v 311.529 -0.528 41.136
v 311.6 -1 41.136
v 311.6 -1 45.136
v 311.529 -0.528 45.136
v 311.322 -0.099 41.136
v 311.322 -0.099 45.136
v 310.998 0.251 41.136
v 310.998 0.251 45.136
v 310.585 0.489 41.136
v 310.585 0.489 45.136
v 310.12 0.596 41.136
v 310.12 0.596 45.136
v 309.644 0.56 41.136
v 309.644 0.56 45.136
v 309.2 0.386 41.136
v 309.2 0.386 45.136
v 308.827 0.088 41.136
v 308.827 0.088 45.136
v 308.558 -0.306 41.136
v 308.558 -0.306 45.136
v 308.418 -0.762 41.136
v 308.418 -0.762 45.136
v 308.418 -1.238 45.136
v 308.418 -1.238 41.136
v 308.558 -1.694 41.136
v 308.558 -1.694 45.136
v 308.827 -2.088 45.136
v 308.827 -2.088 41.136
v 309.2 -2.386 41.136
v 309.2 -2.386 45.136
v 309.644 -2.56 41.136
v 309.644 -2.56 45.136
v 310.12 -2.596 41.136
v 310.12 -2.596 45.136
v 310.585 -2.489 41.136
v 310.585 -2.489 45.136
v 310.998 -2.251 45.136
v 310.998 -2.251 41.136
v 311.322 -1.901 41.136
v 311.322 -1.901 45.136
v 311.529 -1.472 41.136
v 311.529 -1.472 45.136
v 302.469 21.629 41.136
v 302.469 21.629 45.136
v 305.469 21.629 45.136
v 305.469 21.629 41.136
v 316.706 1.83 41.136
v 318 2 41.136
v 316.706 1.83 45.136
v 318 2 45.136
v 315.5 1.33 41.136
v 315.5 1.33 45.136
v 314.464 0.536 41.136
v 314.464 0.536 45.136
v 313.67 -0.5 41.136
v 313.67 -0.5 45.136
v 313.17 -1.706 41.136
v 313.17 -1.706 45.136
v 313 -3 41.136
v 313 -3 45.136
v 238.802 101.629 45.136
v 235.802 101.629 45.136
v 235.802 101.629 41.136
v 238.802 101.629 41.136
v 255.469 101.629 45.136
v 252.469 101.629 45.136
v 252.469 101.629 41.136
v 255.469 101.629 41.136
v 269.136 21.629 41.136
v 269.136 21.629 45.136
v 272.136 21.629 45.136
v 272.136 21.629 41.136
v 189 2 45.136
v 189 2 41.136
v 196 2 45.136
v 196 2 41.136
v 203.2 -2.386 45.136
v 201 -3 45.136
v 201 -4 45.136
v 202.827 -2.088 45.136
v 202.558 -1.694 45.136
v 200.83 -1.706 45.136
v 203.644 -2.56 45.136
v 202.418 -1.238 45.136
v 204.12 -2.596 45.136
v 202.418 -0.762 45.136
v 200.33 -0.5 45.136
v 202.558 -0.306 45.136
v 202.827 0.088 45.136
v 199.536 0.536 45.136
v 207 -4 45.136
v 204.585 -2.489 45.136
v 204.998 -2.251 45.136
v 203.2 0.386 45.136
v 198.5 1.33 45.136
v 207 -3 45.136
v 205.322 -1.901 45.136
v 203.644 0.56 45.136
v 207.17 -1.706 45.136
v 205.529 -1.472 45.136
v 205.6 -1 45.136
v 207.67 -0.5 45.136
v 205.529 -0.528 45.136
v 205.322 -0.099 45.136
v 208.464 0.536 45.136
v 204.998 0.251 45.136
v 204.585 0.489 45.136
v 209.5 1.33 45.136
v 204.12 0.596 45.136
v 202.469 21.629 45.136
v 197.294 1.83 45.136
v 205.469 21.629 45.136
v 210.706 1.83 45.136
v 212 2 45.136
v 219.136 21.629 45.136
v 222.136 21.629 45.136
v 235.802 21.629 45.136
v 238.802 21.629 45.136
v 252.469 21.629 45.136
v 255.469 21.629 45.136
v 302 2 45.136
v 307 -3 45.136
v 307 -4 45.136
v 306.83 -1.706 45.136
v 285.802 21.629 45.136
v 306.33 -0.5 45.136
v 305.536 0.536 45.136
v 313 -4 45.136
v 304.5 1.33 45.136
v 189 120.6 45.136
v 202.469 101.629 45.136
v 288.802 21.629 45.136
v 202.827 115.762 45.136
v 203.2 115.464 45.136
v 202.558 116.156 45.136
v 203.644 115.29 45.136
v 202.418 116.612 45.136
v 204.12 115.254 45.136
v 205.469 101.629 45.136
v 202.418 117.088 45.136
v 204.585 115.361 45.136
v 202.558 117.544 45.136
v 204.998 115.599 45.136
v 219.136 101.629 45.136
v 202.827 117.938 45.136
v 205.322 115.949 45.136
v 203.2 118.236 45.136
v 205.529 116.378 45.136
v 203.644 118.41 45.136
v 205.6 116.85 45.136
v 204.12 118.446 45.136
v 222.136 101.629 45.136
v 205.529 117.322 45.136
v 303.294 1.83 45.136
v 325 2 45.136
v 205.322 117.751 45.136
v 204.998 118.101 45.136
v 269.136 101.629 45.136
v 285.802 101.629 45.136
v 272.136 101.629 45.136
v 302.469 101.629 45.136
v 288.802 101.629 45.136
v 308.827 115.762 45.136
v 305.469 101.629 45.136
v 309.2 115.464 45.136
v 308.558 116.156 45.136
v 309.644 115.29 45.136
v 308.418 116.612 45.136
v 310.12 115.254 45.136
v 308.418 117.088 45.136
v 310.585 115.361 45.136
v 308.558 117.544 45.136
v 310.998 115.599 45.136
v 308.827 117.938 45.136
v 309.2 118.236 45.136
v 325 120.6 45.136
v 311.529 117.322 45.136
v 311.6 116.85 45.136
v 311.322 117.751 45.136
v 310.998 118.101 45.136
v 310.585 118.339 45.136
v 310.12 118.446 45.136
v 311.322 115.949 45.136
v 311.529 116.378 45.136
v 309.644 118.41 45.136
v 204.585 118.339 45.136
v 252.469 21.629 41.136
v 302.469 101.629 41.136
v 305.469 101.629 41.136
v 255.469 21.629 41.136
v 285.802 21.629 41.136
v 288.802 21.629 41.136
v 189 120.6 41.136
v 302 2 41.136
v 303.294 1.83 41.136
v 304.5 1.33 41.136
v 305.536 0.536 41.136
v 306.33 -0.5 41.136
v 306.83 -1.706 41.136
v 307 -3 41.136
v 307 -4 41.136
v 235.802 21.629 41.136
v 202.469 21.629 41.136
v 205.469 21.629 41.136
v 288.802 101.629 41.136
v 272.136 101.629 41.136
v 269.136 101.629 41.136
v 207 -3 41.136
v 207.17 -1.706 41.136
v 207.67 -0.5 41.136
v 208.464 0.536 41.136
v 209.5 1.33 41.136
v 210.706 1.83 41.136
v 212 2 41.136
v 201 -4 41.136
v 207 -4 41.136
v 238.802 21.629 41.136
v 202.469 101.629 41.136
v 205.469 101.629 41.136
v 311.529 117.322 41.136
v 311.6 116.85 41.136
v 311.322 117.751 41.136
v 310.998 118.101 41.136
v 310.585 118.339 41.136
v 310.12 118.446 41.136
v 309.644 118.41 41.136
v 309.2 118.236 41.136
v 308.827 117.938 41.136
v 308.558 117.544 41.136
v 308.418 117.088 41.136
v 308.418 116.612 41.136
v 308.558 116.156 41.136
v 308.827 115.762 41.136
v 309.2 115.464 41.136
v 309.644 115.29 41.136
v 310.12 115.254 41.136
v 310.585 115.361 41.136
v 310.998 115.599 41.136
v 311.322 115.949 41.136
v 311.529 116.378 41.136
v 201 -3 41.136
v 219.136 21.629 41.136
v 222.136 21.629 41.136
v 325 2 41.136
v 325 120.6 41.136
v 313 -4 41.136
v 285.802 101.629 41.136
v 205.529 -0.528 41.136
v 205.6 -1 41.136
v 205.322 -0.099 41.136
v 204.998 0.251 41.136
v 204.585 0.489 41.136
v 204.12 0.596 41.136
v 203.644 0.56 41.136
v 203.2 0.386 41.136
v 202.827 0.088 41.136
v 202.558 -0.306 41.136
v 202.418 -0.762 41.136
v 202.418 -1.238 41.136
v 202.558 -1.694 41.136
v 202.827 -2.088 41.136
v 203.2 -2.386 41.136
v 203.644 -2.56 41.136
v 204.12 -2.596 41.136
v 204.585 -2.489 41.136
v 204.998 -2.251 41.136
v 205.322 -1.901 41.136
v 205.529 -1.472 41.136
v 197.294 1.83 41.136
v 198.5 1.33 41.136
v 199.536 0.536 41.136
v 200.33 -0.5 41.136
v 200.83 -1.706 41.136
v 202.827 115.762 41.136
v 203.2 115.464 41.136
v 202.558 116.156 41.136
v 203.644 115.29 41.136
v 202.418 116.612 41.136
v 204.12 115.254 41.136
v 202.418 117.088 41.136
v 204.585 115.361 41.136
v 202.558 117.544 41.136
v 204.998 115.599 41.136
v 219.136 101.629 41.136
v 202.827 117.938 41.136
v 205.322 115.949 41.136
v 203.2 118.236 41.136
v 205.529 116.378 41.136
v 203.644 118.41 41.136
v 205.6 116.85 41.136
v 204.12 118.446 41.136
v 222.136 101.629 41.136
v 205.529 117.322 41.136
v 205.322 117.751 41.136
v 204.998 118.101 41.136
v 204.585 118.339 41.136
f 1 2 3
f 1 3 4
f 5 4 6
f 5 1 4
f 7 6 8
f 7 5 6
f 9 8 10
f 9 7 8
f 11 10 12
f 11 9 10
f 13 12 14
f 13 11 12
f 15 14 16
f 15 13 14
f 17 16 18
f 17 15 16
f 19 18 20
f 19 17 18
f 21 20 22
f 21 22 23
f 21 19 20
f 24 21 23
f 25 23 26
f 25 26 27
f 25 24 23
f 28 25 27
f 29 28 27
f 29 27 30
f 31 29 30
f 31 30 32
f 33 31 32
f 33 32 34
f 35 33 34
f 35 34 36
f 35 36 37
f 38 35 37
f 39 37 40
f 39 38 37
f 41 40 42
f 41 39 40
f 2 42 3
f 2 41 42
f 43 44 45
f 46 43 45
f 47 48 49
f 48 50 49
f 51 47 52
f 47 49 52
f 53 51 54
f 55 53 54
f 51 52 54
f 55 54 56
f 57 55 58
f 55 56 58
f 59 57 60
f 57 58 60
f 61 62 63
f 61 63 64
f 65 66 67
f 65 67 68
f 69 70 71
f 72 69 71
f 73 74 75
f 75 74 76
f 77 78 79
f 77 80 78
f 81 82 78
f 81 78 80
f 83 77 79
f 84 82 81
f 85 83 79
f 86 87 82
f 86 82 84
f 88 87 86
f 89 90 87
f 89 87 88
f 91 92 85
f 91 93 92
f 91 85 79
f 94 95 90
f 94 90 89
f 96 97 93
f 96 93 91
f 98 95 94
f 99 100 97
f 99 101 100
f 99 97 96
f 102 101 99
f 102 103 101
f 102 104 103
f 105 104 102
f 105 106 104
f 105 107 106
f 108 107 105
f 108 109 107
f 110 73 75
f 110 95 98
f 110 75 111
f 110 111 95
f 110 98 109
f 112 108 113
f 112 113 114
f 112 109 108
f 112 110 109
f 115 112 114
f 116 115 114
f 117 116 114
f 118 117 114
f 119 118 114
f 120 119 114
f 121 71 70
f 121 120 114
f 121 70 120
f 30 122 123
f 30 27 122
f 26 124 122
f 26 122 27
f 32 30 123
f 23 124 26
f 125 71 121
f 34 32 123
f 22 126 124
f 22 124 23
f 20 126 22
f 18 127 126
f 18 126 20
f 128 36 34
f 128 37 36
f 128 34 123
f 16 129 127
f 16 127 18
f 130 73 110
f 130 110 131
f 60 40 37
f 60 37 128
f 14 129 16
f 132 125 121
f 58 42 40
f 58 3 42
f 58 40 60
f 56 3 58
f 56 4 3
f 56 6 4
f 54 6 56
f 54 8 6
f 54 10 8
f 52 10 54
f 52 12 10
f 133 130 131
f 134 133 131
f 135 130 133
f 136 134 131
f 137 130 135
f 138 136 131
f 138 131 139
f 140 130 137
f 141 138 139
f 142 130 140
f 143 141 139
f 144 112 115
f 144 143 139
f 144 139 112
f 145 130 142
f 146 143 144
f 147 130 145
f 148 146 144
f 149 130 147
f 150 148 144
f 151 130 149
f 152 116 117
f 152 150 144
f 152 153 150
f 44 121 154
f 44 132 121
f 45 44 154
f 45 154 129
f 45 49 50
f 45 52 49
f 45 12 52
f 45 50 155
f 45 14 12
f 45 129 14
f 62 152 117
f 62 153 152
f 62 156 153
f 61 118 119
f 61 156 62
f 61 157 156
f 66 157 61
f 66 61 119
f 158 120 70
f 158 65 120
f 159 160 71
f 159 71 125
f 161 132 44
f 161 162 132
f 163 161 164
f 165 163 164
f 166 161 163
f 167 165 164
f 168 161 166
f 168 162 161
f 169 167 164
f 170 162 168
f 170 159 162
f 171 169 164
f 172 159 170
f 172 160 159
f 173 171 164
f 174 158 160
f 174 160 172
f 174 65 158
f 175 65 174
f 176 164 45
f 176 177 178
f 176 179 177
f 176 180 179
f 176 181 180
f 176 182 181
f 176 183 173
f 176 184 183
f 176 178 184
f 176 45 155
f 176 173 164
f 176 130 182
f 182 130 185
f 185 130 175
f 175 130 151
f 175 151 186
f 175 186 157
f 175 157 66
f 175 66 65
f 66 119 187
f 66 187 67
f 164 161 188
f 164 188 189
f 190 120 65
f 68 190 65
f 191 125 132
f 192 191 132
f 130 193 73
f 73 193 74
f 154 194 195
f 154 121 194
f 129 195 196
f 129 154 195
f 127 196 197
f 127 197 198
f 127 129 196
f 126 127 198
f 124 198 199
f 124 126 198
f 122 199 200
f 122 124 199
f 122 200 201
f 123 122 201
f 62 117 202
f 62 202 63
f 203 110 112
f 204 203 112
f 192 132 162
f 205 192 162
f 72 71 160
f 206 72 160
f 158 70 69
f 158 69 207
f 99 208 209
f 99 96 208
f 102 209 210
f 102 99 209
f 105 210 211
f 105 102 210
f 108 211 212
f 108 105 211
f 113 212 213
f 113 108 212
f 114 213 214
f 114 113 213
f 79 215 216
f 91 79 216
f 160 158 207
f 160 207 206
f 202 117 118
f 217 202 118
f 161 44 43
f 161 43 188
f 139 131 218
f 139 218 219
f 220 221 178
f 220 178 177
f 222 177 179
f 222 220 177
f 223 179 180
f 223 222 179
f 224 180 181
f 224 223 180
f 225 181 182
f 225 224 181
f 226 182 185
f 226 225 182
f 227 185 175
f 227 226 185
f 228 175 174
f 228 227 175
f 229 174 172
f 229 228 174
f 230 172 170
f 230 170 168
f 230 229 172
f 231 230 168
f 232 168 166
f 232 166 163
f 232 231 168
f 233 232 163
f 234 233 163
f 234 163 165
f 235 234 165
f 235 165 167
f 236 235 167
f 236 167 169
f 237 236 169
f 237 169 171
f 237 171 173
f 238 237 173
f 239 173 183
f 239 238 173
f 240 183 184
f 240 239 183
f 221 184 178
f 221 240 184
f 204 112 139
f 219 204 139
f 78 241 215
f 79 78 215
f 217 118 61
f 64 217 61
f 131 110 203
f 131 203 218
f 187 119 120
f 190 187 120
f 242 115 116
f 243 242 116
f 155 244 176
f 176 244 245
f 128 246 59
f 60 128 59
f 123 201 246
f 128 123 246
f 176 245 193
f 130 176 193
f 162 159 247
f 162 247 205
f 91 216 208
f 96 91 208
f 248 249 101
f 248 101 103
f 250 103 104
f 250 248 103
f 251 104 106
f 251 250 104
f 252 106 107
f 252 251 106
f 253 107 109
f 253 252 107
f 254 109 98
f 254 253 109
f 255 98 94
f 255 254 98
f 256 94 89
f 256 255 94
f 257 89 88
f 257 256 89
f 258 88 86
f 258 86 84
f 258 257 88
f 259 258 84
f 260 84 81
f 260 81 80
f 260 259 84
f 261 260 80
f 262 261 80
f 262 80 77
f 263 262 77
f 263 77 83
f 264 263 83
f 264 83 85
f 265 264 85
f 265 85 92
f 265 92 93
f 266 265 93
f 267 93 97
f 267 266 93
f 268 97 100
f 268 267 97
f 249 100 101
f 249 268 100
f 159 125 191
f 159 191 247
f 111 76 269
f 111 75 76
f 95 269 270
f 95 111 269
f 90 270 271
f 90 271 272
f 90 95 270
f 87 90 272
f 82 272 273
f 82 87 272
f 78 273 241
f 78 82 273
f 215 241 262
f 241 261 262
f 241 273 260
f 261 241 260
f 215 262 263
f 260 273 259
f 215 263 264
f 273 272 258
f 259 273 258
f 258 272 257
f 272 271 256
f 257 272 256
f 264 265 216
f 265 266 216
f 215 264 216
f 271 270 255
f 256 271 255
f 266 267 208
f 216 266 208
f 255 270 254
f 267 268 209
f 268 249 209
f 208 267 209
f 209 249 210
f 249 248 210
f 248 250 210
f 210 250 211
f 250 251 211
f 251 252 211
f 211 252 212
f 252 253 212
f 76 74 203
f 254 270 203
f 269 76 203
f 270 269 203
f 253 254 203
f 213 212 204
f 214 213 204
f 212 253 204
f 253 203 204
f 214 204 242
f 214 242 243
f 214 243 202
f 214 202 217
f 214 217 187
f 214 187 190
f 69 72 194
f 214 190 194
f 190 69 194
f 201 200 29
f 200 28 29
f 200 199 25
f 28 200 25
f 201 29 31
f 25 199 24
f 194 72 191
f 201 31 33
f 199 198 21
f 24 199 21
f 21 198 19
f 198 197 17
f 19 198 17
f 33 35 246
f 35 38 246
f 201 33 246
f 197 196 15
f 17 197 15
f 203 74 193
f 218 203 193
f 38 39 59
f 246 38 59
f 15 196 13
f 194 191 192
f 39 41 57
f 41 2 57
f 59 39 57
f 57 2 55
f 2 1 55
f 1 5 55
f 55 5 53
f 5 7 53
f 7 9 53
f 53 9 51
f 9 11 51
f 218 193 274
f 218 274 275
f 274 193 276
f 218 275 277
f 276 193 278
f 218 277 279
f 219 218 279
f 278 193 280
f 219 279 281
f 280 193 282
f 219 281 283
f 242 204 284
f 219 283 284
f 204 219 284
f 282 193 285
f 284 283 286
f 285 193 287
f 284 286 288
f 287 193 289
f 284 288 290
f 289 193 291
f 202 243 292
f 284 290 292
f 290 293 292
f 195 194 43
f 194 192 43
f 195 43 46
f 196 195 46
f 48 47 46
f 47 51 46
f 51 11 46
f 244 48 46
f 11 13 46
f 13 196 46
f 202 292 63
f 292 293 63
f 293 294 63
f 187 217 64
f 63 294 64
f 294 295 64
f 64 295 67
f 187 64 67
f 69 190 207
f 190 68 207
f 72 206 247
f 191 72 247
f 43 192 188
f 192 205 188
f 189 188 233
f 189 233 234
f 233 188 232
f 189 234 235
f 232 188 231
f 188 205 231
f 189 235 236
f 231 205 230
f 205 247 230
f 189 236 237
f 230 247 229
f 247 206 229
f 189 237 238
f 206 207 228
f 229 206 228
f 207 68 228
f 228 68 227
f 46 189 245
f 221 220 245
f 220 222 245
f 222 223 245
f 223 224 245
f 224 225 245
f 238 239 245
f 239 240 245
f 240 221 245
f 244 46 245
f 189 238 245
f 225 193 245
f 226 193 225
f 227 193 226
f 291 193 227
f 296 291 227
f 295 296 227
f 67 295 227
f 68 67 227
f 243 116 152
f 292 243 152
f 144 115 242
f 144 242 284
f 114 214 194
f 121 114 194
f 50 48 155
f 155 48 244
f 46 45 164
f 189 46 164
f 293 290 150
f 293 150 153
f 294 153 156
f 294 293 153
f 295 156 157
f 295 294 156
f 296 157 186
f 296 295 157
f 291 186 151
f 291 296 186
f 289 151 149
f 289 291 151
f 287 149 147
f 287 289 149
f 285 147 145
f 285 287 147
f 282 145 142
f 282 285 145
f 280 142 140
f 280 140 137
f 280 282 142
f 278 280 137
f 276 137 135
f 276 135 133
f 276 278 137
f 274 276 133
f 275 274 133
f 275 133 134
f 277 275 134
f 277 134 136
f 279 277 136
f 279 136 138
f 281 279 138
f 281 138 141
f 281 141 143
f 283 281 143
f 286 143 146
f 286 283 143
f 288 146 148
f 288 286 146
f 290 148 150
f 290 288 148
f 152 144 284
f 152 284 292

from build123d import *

# Parameters (mm, degrees)
SKETCH021_R            = 1.6
PAD005_DEPTH           = 4
FILLET_R               = 5
SKETCH022_W            = 3
SKETCH022_H            = 80
POCKET010_DEPTH        = 4.001
LINEARPATTERN002_COUNT = 7
LINEARPATTERN002_PITCH = 16.666667


with BuildPart() as part:
    # Sketch021 (on Face1 of ShapeBinder002) → Pad005 (new body)
    with BuildSketch(Plane.XY.offset(41.135521)):
        Polygon((189, 120.6), (189, 2), (201, 2), (201, -4), (207, -4), (207, 2), (307, 2), (307, -4), (313, -4), (313, 2), (325, 2), (325, 120.6), align=None)
        with Locations((204, -1)):
            Circle(SKETCH021_R, mode=Mode.SUBTRACT)
        with Locations((310, -1)):
            Circle(SKETCH021_R, mode=Mode.SUBTRACT)
        with Locations((204, 116.85)):
            Circle(SKETCH021_R, mode=Mode.SUBTRACT)
        with Locations((310, 116.85)):
            Circle(SKETCH021_R, mode=Mode.SUBTRACT)
    extrude(amount=PAD005_DEPTH)

    # Fillet
    fillet_edges = [part.edges().sort_by_distance(p)[0] for p in [
        (207, 2, 43.135521),
        (201, 2, 43.135521),
        (307, 2, 43.135521),
        (313, 2, 43.135521),
    ]]
    fillet(fillet_edges, radius=FILLET_R)

    # Sketch022 (on Face5 of Fillet) → Pocket010 (cut, through all)
    with BuildSketch(Plane.XY.offset(45.135521)):
        with Locations((203.968842, 61.629364)):
            Rectangle(SKETCH022_W, SKETCH022_H)
    pocket010 = extrude(amount=-POCKET010_DEPTH, mode=Mode.SUBTRACT)

    # LinearPattern002: Pocket010 ×7
    with Locations(*[(i * LINEARPATTERN002_PITCH, 0, 0) for i in range(1, LINEARPATTERN002_COUNT)]):
        add(pocket010, mode=Mode.SUBTRACT)


solid = part.part
